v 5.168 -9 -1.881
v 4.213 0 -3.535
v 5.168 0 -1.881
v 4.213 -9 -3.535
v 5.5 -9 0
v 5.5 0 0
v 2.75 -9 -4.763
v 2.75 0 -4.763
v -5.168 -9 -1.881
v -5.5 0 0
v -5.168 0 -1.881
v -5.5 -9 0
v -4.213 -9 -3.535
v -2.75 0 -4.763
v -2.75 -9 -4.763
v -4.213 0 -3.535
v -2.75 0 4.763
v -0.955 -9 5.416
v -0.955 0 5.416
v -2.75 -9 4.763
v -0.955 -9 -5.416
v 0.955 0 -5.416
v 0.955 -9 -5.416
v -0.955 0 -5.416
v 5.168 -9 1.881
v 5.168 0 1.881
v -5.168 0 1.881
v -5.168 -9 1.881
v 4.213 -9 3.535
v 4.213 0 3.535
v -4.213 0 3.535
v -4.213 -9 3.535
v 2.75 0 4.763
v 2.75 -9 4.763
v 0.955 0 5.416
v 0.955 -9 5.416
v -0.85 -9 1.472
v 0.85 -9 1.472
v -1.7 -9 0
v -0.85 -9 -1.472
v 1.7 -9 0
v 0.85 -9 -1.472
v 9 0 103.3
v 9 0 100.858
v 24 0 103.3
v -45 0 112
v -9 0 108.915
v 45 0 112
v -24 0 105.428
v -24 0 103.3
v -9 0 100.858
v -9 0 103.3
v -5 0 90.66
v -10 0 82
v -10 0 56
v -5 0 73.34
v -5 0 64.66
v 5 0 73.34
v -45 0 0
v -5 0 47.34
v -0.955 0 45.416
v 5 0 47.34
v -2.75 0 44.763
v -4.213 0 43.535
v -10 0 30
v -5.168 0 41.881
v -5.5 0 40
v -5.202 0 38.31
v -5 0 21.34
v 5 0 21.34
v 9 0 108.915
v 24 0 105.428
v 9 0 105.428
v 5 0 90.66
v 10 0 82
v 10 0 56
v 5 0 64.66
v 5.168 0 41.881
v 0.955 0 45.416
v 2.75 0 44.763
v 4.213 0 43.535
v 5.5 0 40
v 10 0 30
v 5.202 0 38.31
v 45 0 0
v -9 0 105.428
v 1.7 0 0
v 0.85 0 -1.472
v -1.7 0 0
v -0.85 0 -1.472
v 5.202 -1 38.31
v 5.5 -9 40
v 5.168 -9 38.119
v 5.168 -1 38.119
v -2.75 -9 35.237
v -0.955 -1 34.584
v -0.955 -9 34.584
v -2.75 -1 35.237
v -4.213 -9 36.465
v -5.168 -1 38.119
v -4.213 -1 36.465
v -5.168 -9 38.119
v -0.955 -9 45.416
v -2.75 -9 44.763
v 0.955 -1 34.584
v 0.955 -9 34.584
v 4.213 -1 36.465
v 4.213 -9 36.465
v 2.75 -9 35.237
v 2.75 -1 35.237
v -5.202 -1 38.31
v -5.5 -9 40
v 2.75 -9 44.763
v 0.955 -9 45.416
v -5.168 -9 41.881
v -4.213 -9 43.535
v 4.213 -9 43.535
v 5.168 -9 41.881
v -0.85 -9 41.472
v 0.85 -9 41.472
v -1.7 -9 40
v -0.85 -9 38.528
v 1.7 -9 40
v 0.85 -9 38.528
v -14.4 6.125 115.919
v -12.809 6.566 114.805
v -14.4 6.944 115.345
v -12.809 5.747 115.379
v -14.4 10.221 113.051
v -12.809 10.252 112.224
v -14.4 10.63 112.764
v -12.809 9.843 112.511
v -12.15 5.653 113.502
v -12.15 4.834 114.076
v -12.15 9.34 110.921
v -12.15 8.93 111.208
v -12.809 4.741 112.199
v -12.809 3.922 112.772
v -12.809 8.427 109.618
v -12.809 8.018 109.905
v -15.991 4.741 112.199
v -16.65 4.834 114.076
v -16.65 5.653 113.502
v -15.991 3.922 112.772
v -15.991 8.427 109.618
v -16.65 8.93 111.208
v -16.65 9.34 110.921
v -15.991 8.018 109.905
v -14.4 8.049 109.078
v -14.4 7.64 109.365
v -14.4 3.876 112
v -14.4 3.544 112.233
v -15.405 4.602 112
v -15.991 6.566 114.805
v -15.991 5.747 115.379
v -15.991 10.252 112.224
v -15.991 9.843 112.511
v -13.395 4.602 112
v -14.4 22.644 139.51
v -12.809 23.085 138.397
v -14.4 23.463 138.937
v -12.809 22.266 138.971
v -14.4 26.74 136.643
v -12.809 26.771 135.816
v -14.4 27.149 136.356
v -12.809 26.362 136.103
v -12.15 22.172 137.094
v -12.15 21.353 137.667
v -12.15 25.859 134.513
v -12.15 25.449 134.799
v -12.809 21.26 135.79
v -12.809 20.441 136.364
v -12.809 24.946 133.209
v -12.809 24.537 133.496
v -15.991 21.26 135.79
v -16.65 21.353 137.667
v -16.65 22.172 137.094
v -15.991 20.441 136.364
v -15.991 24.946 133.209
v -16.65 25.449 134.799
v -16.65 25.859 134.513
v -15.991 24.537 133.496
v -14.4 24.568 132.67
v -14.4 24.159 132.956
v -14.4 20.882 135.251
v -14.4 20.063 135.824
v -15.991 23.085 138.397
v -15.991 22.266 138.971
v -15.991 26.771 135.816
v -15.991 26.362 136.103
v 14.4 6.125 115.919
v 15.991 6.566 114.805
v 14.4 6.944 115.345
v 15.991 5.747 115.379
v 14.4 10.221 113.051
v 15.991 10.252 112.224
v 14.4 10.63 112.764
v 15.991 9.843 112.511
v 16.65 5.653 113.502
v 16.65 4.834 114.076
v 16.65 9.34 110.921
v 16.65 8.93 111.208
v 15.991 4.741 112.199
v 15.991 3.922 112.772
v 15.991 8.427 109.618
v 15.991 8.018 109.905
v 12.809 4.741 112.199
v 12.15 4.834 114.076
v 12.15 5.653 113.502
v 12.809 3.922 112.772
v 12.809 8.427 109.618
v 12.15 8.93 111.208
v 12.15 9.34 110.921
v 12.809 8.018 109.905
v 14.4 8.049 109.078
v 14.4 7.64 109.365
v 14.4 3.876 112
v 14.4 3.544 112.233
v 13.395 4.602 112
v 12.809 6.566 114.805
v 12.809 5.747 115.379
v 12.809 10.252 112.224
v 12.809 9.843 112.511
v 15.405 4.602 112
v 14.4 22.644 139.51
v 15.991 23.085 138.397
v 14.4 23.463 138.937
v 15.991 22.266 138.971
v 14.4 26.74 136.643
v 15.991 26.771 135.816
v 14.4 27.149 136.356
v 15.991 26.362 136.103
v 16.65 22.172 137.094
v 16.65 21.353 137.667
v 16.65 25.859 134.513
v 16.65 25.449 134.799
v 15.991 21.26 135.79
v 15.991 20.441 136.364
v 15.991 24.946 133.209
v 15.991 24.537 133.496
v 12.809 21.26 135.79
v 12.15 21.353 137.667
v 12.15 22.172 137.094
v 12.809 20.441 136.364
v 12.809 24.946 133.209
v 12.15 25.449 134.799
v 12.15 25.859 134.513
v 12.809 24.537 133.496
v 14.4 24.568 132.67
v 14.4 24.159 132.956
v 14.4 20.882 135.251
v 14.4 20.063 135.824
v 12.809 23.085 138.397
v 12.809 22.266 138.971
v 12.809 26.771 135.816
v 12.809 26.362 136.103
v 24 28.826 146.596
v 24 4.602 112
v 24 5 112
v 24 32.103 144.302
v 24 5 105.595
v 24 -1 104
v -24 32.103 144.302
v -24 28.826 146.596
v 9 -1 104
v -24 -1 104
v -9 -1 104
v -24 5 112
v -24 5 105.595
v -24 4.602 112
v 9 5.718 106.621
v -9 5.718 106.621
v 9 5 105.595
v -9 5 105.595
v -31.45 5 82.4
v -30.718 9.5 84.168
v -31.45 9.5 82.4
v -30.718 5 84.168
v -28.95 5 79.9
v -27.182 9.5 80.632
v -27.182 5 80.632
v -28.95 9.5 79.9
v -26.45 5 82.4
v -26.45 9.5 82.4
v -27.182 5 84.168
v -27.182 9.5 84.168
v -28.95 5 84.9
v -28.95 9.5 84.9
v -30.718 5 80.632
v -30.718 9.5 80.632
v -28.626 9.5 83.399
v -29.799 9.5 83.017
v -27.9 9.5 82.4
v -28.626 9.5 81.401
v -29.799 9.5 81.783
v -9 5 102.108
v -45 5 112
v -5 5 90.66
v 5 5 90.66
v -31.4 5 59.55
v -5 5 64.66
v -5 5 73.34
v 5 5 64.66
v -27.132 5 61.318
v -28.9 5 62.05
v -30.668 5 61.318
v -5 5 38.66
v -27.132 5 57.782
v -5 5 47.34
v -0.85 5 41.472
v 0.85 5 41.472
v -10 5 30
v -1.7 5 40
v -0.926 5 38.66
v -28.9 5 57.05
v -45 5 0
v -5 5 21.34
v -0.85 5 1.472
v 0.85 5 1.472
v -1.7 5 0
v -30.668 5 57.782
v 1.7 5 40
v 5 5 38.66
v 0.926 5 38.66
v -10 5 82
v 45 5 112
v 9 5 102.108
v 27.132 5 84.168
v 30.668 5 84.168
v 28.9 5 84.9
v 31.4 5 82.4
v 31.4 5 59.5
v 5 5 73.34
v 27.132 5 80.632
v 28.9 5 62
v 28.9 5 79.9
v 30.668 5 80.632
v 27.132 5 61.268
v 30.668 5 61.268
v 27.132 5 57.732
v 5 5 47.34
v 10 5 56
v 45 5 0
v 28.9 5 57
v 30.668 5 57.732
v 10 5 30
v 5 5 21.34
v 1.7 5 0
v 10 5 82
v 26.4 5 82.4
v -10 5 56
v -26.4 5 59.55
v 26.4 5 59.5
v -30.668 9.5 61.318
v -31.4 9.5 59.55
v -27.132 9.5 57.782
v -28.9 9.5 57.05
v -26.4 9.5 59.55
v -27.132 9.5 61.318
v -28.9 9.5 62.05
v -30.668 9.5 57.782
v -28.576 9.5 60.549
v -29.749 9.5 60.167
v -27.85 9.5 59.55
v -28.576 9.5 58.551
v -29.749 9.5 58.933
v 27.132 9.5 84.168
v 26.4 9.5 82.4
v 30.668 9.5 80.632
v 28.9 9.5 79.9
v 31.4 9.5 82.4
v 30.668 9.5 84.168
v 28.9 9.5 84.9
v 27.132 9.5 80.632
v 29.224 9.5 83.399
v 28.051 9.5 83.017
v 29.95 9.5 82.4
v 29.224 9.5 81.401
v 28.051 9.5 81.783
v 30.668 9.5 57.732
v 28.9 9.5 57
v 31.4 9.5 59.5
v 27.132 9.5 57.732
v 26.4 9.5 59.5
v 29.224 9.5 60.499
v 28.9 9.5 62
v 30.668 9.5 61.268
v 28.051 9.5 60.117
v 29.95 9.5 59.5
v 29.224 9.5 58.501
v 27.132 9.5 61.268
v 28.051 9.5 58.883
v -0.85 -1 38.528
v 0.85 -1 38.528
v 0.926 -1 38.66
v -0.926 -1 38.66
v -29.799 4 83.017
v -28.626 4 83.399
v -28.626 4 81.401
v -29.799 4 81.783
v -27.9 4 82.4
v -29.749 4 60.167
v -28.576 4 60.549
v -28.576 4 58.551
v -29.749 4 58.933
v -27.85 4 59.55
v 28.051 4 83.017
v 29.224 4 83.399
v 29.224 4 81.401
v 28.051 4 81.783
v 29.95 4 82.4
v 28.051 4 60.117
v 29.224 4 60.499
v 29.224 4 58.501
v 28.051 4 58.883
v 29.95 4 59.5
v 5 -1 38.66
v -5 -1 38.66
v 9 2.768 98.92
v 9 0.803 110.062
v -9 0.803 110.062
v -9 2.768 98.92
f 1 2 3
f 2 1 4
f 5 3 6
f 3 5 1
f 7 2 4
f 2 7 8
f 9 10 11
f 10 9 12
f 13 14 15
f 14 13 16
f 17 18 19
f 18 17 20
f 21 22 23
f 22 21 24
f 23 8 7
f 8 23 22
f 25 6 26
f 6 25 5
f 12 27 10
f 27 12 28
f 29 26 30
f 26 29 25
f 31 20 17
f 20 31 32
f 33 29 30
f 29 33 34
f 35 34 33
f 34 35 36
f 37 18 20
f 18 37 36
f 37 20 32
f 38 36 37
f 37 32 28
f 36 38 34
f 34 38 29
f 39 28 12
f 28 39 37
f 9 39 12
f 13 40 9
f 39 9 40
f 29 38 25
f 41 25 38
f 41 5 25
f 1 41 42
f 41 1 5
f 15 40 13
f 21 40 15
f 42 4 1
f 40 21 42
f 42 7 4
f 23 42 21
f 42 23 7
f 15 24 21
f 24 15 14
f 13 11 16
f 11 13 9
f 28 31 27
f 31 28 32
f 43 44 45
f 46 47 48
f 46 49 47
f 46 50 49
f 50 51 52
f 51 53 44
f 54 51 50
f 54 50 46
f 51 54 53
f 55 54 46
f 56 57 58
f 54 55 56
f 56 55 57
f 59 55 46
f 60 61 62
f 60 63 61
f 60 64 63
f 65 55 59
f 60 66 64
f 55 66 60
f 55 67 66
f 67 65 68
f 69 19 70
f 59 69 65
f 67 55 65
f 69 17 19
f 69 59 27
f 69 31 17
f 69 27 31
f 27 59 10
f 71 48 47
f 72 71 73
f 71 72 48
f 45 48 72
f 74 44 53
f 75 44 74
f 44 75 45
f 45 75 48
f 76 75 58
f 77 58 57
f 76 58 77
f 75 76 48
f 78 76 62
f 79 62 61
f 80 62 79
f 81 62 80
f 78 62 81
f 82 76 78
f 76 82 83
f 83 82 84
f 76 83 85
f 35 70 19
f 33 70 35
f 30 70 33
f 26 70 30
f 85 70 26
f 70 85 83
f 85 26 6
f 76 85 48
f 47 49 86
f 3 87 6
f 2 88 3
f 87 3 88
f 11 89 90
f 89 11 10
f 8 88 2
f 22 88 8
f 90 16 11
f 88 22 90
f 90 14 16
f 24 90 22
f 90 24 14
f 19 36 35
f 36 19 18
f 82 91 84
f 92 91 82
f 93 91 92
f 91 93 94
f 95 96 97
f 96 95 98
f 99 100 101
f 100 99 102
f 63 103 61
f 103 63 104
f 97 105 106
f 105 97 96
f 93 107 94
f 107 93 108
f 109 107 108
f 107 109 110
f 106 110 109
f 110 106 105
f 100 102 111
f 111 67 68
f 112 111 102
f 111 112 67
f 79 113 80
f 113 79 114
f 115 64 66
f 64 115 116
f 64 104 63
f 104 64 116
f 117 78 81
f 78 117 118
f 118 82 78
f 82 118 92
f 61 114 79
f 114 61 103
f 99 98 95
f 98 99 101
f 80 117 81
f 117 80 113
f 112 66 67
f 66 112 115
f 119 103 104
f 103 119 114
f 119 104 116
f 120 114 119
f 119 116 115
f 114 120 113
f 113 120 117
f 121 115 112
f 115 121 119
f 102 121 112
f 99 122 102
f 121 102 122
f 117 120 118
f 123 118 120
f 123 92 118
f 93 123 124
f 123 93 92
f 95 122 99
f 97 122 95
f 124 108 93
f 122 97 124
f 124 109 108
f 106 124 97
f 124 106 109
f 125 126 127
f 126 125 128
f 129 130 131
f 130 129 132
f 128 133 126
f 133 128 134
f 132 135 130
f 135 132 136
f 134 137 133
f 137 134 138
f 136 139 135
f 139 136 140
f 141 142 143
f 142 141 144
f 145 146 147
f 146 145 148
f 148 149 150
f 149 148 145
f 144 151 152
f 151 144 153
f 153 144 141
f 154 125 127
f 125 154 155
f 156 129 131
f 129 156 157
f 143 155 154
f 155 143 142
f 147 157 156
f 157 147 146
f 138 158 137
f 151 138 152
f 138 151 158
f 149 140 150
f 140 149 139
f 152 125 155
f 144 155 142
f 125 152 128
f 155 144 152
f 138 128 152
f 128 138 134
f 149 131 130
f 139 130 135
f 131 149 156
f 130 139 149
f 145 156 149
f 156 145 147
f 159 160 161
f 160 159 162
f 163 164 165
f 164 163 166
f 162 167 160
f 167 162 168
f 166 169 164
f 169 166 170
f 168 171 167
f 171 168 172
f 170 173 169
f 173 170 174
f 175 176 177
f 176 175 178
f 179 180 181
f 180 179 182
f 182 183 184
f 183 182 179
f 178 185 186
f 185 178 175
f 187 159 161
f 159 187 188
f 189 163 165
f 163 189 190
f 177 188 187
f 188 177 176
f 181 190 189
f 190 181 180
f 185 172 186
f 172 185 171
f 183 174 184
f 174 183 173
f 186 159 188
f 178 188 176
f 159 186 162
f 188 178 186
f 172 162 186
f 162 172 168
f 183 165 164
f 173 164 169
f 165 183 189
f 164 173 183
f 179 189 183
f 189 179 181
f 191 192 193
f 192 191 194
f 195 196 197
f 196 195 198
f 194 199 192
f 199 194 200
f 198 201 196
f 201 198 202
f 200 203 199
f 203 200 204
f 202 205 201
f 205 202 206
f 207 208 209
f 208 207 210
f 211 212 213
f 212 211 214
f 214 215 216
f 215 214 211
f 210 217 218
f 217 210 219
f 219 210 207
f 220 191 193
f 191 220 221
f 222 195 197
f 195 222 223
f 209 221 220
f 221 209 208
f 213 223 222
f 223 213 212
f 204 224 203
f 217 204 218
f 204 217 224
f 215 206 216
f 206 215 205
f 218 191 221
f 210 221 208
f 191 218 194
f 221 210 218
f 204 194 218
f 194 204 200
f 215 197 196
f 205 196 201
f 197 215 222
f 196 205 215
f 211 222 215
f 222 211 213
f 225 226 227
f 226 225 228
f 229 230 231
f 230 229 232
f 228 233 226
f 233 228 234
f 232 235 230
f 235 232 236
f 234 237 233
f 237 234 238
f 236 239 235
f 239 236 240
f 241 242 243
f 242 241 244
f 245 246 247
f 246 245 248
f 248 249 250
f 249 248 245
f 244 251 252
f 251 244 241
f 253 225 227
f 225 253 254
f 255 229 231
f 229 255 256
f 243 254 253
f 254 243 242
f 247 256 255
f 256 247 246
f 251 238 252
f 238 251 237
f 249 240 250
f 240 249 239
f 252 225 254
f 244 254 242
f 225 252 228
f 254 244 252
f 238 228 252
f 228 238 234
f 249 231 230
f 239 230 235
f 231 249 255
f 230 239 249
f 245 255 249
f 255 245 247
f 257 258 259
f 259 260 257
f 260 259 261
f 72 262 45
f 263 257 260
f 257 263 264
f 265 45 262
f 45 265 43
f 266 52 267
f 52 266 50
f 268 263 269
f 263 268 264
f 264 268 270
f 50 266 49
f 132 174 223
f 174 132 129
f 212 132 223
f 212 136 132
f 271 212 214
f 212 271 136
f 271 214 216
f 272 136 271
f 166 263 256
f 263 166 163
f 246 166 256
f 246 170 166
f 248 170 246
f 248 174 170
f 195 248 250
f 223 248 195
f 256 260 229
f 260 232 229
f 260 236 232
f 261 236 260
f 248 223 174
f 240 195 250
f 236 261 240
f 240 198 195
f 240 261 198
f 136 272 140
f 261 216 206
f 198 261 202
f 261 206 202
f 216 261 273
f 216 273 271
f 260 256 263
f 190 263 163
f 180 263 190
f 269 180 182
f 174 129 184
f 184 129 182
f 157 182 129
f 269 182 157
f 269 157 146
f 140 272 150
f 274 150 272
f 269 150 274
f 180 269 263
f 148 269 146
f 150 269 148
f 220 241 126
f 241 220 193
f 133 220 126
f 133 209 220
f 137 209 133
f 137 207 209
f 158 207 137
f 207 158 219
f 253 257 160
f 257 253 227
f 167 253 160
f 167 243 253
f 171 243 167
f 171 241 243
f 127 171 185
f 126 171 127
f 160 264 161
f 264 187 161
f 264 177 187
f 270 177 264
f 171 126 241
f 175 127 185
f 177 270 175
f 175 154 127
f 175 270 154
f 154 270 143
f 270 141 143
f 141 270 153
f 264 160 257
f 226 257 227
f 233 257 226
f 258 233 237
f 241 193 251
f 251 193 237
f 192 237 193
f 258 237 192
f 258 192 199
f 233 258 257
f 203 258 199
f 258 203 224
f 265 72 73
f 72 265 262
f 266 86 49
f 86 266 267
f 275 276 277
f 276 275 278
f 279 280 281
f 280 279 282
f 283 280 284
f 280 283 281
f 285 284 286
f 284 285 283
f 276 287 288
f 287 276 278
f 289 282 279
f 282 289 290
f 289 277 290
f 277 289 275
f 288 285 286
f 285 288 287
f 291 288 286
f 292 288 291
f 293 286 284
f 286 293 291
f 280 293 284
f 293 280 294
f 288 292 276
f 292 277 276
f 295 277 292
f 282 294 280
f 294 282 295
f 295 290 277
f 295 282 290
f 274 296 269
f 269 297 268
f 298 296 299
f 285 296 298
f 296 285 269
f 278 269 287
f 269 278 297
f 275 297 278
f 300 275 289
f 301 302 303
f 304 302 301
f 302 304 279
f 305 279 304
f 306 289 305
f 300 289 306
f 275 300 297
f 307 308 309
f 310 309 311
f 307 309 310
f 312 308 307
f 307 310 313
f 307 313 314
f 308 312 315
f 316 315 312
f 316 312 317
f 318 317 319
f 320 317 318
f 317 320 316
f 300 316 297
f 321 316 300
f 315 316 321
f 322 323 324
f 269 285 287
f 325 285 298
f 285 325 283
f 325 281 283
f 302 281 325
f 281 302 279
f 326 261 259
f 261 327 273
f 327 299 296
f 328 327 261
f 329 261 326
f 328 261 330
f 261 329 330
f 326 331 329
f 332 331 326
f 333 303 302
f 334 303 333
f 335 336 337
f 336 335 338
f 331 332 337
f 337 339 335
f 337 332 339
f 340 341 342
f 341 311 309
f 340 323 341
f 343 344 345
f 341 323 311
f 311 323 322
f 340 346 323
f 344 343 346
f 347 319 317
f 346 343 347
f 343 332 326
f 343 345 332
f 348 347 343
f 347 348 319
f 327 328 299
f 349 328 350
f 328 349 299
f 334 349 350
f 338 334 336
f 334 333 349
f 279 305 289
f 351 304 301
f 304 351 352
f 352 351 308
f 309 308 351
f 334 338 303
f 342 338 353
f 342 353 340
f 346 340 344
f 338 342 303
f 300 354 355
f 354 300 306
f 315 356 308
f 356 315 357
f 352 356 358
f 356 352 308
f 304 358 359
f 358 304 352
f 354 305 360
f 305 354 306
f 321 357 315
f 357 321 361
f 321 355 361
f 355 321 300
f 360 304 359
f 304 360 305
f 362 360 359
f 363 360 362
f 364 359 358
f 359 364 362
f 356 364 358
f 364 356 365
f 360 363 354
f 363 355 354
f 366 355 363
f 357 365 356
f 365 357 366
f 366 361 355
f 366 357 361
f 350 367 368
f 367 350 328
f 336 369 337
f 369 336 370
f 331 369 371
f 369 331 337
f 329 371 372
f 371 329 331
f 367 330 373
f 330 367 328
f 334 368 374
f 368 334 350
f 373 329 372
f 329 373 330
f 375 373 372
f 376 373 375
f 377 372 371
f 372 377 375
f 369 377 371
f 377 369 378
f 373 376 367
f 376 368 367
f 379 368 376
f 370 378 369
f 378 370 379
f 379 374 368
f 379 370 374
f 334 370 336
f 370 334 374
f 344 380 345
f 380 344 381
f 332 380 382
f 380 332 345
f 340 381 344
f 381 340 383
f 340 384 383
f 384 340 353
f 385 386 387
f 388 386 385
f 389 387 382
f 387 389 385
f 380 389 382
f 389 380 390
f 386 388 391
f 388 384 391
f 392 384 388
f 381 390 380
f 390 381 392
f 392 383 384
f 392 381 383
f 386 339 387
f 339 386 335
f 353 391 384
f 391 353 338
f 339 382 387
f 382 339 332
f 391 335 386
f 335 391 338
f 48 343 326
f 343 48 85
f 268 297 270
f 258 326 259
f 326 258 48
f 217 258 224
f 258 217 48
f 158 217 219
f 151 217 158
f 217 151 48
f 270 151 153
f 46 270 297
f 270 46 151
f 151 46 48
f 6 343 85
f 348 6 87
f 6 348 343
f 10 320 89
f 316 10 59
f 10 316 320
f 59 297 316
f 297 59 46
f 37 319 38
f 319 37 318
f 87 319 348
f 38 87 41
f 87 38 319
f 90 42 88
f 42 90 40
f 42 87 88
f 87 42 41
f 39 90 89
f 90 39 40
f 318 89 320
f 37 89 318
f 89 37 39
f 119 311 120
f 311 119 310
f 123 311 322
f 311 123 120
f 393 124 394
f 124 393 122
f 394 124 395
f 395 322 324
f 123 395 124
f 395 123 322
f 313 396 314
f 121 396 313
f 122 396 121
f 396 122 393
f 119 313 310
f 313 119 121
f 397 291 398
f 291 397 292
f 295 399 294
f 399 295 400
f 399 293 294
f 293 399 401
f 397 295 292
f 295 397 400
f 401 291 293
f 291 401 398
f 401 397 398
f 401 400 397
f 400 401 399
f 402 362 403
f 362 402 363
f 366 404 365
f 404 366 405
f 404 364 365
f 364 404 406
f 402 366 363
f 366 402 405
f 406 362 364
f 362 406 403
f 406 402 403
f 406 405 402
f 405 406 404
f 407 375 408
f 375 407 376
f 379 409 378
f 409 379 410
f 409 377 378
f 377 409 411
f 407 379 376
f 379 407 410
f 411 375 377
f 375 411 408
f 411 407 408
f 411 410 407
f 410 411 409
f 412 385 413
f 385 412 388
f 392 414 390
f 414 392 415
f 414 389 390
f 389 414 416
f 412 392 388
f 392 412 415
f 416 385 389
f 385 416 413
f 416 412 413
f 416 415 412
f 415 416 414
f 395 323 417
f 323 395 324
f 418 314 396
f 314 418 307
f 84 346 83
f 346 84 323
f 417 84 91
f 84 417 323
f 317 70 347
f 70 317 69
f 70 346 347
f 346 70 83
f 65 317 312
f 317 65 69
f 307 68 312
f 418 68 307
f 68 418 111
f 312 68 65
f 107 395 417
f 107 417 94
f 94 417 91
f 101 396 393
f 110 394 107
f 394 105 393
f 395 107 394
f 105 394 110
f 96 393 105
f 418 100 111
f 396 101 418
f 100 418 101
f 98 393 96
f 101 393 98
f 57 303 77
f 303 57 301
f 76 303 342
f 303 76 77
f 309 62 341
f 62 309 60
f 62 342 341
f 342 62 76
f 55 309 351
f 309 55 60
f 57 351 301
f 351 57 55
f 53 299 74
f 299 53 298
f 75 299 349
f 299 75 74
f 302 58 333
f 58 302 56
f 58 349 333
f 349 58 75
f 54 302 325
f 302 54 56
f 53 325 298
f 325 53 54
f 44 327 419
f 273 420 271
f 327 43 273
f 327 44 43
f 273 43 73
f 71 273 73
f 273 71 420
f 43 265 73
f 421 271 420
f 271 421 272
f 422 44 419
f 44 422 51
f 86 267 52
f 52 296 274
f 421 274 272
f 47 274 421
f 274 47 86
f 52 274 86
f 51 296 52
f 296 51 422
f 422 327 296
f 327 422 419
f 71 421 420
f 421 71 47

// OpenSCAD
// Sentinel V3 — ONE-PIECE, ZERO-SUPPORT bracket for Ender-3 V3 SE
// FIRST PRINCIPLES, take three (2026-08-17):
//   - The only reason V2 needed supports was horizontal hub cylinders.
//     V3 eliminates every long horizontal feature:
//       * plate = vertical wall (prints free)
//       * camera face = 35° lean (< 45° overhang limit -> prints free)
//       * standoffs/board bosses/camera posts = all <= 9mm stubs
//   - Result: the slicer generates NO supports. Nothing to break away.
//   - Camera aim is FIXED (35° down) — wide M12 FOV covers the bed.
//
// INSTALL: +Y faces the bed. Plate bolts to the two cap screws (40mm o/c
// vertical, left end cap) via standoff bosses on the -Y face. Zero 3W
// mounts flat on the +Y face (ports UP). Camera mounts on the lean face
// at the top, looking down at the bed.
//
// part = "bracket" | "preview"

part = "bracket"; // [bracket, preview]

/* [Cap interface — MEASURED 2026-08-16/17] */
screw_spacing = 40.0;   // cap screws, VERTICAL, one above the other
standoff     = 9.0;     // plate back -> cap face (clears irregular cap)
screw_pilot  = 3.4;     // M3 clearance

/* [Hardware] */
cam_pilot = 1.7;        // M2 self-tap (camera posts)
z3w_pilot = 2.1;        // M2.5 self-tap (Zero 3W bosses)

/* [Zero 3W — Radxa v1.11 DXF] */
z3w_x = 65.0; z3w_y = 30.0;
z3w_holes = [[3.55,3.60],[3.60,26.45],[61.40,3.60],[61.40,26.50]];

/* [Camera — measured] */
cam_grid = 28.8; lens_d = 17.0;
cam_lean = 35.0;        // camera face lean from vertical (deg) — <45 => no support

/* [Structure] */
plate_t = 5.0;          // plate thickness (Y)
plate_w = 90.0;         // plate width (X)
plate_h = 112.0;        // vertical plate height (Z)
boss_h  = 4.5;          // Zero 3W boss height (+Y from plate face)
z0      = 56.0;         // board bottom edge height (above upper screw + pocket)

// ===============================================================
module bracket() {
    difference() {
        union() {
            // vertical plate (prints as a wall)
            translate([-plate_w/2, 0, 0]) cube([plate_w, plate_t, plate_h]);
            // standoff bosses on -Y face, at z=0 and z=40 (cap screws)
            for (sz = [0, screw_spacing])
                translate([0, -standoff, sz]) rotate([-90,0,0])
                    cylinder(d = 11, h = standoff);
            // camera lean face assembly: slab + posts, all in ONE transform
            // so the posts actually connect to the slab (fixes 6-shell bug)
            translate([0, plate_t - 6, plate_h - 8]) rotate([-cam_lean, 0, 0]) {
                translate([-24, 0, 0]) cube([48, 4, 52]);   // the lean slab, CENTERED on local X
                for (sx = [-cam_grid/2, cam_grid/2], sz = [-cam_grid/2, cam_grid/2])
                    translate([sx, 4.5, 26 + sz]) rotate([90,0,0])
                        cylinder(d = 4.5, h = 5.5);      // posts bite 4mm into slab
            }
            // Zero 3W bosses on +Y face (ports UP)
            for (hxy = z3w_holes)
                translate([hxy[0]-z3w_x/2, plate_t, z0 + (z3w_y - hxy[1])])
                    rotate([-90,0,0]) cylinder(d=5, h=boss_h);
        }
        // standoff screw holes (M3 through standoff+plate, vertical in print)
        for (sz = [0, screw_spacing])
            translate([0, -standoff - 1, sz])
                rotate([-90,0,0]) cylinder(d = screw_pilot, h = standoff + plate_t + 2);
        // Zero 3W boss pilots
        for (hxy = z3w_holes)
            translate([hxy[0]-z3w_x/2, plate_t - 1, z0 + (z3w_y - hxy[1])])
                rotate([-90,0,0]) cylinder(d = z3w_pilot, h = boss_h + 2);
        // lens bore through the lean face (local slab coords)
        translate([0, plate_t - 6, plate_h - 8]) rotate([-cam_lean,0,0])
            translate([0, -6, 26]) rotate([90,0,0])
                cylinder(d = lens_d, h = 16);
        // camera post pilots (local slab coords)
        translate([0, plate_t - 6, plate_h - 8]) rotate([-cam_lean,0,0])
            for (sx = [-cam_grid/2, cam_grid/2], sz = [-cam_grid/2, cam_grid/2])
                translate([sx, -1.5, 26 + sz]) rotate([90,0,0])
                    cylinder(d = cam_pilot, h = 7);
        // ribbon slot through lean face bottom edge
        translate([0, plate_t - 6, plate_h - 8]) rotate([-cam_lean,0,0])
            translate([-9, -2, -2]) cube([18, 8, 8]);
        // lightening windows (hexes through plate)
        for (zz = [30, 56, 82])
            translate([0, -1, zz]) rotate([-90,0,0])
                cylinder(d = 20, h = plate_t + 2, $fn = 6);
    }
}

// ===============================================================
if (part == "bracket") bracket();
if (part == "print")  rotate([0, 90, 0]) bracket();   // plate FACE flat on bed (rotY90)
if (part == "preview") {
    color([0.1, 0.1, 0.11]) bracket();
}
